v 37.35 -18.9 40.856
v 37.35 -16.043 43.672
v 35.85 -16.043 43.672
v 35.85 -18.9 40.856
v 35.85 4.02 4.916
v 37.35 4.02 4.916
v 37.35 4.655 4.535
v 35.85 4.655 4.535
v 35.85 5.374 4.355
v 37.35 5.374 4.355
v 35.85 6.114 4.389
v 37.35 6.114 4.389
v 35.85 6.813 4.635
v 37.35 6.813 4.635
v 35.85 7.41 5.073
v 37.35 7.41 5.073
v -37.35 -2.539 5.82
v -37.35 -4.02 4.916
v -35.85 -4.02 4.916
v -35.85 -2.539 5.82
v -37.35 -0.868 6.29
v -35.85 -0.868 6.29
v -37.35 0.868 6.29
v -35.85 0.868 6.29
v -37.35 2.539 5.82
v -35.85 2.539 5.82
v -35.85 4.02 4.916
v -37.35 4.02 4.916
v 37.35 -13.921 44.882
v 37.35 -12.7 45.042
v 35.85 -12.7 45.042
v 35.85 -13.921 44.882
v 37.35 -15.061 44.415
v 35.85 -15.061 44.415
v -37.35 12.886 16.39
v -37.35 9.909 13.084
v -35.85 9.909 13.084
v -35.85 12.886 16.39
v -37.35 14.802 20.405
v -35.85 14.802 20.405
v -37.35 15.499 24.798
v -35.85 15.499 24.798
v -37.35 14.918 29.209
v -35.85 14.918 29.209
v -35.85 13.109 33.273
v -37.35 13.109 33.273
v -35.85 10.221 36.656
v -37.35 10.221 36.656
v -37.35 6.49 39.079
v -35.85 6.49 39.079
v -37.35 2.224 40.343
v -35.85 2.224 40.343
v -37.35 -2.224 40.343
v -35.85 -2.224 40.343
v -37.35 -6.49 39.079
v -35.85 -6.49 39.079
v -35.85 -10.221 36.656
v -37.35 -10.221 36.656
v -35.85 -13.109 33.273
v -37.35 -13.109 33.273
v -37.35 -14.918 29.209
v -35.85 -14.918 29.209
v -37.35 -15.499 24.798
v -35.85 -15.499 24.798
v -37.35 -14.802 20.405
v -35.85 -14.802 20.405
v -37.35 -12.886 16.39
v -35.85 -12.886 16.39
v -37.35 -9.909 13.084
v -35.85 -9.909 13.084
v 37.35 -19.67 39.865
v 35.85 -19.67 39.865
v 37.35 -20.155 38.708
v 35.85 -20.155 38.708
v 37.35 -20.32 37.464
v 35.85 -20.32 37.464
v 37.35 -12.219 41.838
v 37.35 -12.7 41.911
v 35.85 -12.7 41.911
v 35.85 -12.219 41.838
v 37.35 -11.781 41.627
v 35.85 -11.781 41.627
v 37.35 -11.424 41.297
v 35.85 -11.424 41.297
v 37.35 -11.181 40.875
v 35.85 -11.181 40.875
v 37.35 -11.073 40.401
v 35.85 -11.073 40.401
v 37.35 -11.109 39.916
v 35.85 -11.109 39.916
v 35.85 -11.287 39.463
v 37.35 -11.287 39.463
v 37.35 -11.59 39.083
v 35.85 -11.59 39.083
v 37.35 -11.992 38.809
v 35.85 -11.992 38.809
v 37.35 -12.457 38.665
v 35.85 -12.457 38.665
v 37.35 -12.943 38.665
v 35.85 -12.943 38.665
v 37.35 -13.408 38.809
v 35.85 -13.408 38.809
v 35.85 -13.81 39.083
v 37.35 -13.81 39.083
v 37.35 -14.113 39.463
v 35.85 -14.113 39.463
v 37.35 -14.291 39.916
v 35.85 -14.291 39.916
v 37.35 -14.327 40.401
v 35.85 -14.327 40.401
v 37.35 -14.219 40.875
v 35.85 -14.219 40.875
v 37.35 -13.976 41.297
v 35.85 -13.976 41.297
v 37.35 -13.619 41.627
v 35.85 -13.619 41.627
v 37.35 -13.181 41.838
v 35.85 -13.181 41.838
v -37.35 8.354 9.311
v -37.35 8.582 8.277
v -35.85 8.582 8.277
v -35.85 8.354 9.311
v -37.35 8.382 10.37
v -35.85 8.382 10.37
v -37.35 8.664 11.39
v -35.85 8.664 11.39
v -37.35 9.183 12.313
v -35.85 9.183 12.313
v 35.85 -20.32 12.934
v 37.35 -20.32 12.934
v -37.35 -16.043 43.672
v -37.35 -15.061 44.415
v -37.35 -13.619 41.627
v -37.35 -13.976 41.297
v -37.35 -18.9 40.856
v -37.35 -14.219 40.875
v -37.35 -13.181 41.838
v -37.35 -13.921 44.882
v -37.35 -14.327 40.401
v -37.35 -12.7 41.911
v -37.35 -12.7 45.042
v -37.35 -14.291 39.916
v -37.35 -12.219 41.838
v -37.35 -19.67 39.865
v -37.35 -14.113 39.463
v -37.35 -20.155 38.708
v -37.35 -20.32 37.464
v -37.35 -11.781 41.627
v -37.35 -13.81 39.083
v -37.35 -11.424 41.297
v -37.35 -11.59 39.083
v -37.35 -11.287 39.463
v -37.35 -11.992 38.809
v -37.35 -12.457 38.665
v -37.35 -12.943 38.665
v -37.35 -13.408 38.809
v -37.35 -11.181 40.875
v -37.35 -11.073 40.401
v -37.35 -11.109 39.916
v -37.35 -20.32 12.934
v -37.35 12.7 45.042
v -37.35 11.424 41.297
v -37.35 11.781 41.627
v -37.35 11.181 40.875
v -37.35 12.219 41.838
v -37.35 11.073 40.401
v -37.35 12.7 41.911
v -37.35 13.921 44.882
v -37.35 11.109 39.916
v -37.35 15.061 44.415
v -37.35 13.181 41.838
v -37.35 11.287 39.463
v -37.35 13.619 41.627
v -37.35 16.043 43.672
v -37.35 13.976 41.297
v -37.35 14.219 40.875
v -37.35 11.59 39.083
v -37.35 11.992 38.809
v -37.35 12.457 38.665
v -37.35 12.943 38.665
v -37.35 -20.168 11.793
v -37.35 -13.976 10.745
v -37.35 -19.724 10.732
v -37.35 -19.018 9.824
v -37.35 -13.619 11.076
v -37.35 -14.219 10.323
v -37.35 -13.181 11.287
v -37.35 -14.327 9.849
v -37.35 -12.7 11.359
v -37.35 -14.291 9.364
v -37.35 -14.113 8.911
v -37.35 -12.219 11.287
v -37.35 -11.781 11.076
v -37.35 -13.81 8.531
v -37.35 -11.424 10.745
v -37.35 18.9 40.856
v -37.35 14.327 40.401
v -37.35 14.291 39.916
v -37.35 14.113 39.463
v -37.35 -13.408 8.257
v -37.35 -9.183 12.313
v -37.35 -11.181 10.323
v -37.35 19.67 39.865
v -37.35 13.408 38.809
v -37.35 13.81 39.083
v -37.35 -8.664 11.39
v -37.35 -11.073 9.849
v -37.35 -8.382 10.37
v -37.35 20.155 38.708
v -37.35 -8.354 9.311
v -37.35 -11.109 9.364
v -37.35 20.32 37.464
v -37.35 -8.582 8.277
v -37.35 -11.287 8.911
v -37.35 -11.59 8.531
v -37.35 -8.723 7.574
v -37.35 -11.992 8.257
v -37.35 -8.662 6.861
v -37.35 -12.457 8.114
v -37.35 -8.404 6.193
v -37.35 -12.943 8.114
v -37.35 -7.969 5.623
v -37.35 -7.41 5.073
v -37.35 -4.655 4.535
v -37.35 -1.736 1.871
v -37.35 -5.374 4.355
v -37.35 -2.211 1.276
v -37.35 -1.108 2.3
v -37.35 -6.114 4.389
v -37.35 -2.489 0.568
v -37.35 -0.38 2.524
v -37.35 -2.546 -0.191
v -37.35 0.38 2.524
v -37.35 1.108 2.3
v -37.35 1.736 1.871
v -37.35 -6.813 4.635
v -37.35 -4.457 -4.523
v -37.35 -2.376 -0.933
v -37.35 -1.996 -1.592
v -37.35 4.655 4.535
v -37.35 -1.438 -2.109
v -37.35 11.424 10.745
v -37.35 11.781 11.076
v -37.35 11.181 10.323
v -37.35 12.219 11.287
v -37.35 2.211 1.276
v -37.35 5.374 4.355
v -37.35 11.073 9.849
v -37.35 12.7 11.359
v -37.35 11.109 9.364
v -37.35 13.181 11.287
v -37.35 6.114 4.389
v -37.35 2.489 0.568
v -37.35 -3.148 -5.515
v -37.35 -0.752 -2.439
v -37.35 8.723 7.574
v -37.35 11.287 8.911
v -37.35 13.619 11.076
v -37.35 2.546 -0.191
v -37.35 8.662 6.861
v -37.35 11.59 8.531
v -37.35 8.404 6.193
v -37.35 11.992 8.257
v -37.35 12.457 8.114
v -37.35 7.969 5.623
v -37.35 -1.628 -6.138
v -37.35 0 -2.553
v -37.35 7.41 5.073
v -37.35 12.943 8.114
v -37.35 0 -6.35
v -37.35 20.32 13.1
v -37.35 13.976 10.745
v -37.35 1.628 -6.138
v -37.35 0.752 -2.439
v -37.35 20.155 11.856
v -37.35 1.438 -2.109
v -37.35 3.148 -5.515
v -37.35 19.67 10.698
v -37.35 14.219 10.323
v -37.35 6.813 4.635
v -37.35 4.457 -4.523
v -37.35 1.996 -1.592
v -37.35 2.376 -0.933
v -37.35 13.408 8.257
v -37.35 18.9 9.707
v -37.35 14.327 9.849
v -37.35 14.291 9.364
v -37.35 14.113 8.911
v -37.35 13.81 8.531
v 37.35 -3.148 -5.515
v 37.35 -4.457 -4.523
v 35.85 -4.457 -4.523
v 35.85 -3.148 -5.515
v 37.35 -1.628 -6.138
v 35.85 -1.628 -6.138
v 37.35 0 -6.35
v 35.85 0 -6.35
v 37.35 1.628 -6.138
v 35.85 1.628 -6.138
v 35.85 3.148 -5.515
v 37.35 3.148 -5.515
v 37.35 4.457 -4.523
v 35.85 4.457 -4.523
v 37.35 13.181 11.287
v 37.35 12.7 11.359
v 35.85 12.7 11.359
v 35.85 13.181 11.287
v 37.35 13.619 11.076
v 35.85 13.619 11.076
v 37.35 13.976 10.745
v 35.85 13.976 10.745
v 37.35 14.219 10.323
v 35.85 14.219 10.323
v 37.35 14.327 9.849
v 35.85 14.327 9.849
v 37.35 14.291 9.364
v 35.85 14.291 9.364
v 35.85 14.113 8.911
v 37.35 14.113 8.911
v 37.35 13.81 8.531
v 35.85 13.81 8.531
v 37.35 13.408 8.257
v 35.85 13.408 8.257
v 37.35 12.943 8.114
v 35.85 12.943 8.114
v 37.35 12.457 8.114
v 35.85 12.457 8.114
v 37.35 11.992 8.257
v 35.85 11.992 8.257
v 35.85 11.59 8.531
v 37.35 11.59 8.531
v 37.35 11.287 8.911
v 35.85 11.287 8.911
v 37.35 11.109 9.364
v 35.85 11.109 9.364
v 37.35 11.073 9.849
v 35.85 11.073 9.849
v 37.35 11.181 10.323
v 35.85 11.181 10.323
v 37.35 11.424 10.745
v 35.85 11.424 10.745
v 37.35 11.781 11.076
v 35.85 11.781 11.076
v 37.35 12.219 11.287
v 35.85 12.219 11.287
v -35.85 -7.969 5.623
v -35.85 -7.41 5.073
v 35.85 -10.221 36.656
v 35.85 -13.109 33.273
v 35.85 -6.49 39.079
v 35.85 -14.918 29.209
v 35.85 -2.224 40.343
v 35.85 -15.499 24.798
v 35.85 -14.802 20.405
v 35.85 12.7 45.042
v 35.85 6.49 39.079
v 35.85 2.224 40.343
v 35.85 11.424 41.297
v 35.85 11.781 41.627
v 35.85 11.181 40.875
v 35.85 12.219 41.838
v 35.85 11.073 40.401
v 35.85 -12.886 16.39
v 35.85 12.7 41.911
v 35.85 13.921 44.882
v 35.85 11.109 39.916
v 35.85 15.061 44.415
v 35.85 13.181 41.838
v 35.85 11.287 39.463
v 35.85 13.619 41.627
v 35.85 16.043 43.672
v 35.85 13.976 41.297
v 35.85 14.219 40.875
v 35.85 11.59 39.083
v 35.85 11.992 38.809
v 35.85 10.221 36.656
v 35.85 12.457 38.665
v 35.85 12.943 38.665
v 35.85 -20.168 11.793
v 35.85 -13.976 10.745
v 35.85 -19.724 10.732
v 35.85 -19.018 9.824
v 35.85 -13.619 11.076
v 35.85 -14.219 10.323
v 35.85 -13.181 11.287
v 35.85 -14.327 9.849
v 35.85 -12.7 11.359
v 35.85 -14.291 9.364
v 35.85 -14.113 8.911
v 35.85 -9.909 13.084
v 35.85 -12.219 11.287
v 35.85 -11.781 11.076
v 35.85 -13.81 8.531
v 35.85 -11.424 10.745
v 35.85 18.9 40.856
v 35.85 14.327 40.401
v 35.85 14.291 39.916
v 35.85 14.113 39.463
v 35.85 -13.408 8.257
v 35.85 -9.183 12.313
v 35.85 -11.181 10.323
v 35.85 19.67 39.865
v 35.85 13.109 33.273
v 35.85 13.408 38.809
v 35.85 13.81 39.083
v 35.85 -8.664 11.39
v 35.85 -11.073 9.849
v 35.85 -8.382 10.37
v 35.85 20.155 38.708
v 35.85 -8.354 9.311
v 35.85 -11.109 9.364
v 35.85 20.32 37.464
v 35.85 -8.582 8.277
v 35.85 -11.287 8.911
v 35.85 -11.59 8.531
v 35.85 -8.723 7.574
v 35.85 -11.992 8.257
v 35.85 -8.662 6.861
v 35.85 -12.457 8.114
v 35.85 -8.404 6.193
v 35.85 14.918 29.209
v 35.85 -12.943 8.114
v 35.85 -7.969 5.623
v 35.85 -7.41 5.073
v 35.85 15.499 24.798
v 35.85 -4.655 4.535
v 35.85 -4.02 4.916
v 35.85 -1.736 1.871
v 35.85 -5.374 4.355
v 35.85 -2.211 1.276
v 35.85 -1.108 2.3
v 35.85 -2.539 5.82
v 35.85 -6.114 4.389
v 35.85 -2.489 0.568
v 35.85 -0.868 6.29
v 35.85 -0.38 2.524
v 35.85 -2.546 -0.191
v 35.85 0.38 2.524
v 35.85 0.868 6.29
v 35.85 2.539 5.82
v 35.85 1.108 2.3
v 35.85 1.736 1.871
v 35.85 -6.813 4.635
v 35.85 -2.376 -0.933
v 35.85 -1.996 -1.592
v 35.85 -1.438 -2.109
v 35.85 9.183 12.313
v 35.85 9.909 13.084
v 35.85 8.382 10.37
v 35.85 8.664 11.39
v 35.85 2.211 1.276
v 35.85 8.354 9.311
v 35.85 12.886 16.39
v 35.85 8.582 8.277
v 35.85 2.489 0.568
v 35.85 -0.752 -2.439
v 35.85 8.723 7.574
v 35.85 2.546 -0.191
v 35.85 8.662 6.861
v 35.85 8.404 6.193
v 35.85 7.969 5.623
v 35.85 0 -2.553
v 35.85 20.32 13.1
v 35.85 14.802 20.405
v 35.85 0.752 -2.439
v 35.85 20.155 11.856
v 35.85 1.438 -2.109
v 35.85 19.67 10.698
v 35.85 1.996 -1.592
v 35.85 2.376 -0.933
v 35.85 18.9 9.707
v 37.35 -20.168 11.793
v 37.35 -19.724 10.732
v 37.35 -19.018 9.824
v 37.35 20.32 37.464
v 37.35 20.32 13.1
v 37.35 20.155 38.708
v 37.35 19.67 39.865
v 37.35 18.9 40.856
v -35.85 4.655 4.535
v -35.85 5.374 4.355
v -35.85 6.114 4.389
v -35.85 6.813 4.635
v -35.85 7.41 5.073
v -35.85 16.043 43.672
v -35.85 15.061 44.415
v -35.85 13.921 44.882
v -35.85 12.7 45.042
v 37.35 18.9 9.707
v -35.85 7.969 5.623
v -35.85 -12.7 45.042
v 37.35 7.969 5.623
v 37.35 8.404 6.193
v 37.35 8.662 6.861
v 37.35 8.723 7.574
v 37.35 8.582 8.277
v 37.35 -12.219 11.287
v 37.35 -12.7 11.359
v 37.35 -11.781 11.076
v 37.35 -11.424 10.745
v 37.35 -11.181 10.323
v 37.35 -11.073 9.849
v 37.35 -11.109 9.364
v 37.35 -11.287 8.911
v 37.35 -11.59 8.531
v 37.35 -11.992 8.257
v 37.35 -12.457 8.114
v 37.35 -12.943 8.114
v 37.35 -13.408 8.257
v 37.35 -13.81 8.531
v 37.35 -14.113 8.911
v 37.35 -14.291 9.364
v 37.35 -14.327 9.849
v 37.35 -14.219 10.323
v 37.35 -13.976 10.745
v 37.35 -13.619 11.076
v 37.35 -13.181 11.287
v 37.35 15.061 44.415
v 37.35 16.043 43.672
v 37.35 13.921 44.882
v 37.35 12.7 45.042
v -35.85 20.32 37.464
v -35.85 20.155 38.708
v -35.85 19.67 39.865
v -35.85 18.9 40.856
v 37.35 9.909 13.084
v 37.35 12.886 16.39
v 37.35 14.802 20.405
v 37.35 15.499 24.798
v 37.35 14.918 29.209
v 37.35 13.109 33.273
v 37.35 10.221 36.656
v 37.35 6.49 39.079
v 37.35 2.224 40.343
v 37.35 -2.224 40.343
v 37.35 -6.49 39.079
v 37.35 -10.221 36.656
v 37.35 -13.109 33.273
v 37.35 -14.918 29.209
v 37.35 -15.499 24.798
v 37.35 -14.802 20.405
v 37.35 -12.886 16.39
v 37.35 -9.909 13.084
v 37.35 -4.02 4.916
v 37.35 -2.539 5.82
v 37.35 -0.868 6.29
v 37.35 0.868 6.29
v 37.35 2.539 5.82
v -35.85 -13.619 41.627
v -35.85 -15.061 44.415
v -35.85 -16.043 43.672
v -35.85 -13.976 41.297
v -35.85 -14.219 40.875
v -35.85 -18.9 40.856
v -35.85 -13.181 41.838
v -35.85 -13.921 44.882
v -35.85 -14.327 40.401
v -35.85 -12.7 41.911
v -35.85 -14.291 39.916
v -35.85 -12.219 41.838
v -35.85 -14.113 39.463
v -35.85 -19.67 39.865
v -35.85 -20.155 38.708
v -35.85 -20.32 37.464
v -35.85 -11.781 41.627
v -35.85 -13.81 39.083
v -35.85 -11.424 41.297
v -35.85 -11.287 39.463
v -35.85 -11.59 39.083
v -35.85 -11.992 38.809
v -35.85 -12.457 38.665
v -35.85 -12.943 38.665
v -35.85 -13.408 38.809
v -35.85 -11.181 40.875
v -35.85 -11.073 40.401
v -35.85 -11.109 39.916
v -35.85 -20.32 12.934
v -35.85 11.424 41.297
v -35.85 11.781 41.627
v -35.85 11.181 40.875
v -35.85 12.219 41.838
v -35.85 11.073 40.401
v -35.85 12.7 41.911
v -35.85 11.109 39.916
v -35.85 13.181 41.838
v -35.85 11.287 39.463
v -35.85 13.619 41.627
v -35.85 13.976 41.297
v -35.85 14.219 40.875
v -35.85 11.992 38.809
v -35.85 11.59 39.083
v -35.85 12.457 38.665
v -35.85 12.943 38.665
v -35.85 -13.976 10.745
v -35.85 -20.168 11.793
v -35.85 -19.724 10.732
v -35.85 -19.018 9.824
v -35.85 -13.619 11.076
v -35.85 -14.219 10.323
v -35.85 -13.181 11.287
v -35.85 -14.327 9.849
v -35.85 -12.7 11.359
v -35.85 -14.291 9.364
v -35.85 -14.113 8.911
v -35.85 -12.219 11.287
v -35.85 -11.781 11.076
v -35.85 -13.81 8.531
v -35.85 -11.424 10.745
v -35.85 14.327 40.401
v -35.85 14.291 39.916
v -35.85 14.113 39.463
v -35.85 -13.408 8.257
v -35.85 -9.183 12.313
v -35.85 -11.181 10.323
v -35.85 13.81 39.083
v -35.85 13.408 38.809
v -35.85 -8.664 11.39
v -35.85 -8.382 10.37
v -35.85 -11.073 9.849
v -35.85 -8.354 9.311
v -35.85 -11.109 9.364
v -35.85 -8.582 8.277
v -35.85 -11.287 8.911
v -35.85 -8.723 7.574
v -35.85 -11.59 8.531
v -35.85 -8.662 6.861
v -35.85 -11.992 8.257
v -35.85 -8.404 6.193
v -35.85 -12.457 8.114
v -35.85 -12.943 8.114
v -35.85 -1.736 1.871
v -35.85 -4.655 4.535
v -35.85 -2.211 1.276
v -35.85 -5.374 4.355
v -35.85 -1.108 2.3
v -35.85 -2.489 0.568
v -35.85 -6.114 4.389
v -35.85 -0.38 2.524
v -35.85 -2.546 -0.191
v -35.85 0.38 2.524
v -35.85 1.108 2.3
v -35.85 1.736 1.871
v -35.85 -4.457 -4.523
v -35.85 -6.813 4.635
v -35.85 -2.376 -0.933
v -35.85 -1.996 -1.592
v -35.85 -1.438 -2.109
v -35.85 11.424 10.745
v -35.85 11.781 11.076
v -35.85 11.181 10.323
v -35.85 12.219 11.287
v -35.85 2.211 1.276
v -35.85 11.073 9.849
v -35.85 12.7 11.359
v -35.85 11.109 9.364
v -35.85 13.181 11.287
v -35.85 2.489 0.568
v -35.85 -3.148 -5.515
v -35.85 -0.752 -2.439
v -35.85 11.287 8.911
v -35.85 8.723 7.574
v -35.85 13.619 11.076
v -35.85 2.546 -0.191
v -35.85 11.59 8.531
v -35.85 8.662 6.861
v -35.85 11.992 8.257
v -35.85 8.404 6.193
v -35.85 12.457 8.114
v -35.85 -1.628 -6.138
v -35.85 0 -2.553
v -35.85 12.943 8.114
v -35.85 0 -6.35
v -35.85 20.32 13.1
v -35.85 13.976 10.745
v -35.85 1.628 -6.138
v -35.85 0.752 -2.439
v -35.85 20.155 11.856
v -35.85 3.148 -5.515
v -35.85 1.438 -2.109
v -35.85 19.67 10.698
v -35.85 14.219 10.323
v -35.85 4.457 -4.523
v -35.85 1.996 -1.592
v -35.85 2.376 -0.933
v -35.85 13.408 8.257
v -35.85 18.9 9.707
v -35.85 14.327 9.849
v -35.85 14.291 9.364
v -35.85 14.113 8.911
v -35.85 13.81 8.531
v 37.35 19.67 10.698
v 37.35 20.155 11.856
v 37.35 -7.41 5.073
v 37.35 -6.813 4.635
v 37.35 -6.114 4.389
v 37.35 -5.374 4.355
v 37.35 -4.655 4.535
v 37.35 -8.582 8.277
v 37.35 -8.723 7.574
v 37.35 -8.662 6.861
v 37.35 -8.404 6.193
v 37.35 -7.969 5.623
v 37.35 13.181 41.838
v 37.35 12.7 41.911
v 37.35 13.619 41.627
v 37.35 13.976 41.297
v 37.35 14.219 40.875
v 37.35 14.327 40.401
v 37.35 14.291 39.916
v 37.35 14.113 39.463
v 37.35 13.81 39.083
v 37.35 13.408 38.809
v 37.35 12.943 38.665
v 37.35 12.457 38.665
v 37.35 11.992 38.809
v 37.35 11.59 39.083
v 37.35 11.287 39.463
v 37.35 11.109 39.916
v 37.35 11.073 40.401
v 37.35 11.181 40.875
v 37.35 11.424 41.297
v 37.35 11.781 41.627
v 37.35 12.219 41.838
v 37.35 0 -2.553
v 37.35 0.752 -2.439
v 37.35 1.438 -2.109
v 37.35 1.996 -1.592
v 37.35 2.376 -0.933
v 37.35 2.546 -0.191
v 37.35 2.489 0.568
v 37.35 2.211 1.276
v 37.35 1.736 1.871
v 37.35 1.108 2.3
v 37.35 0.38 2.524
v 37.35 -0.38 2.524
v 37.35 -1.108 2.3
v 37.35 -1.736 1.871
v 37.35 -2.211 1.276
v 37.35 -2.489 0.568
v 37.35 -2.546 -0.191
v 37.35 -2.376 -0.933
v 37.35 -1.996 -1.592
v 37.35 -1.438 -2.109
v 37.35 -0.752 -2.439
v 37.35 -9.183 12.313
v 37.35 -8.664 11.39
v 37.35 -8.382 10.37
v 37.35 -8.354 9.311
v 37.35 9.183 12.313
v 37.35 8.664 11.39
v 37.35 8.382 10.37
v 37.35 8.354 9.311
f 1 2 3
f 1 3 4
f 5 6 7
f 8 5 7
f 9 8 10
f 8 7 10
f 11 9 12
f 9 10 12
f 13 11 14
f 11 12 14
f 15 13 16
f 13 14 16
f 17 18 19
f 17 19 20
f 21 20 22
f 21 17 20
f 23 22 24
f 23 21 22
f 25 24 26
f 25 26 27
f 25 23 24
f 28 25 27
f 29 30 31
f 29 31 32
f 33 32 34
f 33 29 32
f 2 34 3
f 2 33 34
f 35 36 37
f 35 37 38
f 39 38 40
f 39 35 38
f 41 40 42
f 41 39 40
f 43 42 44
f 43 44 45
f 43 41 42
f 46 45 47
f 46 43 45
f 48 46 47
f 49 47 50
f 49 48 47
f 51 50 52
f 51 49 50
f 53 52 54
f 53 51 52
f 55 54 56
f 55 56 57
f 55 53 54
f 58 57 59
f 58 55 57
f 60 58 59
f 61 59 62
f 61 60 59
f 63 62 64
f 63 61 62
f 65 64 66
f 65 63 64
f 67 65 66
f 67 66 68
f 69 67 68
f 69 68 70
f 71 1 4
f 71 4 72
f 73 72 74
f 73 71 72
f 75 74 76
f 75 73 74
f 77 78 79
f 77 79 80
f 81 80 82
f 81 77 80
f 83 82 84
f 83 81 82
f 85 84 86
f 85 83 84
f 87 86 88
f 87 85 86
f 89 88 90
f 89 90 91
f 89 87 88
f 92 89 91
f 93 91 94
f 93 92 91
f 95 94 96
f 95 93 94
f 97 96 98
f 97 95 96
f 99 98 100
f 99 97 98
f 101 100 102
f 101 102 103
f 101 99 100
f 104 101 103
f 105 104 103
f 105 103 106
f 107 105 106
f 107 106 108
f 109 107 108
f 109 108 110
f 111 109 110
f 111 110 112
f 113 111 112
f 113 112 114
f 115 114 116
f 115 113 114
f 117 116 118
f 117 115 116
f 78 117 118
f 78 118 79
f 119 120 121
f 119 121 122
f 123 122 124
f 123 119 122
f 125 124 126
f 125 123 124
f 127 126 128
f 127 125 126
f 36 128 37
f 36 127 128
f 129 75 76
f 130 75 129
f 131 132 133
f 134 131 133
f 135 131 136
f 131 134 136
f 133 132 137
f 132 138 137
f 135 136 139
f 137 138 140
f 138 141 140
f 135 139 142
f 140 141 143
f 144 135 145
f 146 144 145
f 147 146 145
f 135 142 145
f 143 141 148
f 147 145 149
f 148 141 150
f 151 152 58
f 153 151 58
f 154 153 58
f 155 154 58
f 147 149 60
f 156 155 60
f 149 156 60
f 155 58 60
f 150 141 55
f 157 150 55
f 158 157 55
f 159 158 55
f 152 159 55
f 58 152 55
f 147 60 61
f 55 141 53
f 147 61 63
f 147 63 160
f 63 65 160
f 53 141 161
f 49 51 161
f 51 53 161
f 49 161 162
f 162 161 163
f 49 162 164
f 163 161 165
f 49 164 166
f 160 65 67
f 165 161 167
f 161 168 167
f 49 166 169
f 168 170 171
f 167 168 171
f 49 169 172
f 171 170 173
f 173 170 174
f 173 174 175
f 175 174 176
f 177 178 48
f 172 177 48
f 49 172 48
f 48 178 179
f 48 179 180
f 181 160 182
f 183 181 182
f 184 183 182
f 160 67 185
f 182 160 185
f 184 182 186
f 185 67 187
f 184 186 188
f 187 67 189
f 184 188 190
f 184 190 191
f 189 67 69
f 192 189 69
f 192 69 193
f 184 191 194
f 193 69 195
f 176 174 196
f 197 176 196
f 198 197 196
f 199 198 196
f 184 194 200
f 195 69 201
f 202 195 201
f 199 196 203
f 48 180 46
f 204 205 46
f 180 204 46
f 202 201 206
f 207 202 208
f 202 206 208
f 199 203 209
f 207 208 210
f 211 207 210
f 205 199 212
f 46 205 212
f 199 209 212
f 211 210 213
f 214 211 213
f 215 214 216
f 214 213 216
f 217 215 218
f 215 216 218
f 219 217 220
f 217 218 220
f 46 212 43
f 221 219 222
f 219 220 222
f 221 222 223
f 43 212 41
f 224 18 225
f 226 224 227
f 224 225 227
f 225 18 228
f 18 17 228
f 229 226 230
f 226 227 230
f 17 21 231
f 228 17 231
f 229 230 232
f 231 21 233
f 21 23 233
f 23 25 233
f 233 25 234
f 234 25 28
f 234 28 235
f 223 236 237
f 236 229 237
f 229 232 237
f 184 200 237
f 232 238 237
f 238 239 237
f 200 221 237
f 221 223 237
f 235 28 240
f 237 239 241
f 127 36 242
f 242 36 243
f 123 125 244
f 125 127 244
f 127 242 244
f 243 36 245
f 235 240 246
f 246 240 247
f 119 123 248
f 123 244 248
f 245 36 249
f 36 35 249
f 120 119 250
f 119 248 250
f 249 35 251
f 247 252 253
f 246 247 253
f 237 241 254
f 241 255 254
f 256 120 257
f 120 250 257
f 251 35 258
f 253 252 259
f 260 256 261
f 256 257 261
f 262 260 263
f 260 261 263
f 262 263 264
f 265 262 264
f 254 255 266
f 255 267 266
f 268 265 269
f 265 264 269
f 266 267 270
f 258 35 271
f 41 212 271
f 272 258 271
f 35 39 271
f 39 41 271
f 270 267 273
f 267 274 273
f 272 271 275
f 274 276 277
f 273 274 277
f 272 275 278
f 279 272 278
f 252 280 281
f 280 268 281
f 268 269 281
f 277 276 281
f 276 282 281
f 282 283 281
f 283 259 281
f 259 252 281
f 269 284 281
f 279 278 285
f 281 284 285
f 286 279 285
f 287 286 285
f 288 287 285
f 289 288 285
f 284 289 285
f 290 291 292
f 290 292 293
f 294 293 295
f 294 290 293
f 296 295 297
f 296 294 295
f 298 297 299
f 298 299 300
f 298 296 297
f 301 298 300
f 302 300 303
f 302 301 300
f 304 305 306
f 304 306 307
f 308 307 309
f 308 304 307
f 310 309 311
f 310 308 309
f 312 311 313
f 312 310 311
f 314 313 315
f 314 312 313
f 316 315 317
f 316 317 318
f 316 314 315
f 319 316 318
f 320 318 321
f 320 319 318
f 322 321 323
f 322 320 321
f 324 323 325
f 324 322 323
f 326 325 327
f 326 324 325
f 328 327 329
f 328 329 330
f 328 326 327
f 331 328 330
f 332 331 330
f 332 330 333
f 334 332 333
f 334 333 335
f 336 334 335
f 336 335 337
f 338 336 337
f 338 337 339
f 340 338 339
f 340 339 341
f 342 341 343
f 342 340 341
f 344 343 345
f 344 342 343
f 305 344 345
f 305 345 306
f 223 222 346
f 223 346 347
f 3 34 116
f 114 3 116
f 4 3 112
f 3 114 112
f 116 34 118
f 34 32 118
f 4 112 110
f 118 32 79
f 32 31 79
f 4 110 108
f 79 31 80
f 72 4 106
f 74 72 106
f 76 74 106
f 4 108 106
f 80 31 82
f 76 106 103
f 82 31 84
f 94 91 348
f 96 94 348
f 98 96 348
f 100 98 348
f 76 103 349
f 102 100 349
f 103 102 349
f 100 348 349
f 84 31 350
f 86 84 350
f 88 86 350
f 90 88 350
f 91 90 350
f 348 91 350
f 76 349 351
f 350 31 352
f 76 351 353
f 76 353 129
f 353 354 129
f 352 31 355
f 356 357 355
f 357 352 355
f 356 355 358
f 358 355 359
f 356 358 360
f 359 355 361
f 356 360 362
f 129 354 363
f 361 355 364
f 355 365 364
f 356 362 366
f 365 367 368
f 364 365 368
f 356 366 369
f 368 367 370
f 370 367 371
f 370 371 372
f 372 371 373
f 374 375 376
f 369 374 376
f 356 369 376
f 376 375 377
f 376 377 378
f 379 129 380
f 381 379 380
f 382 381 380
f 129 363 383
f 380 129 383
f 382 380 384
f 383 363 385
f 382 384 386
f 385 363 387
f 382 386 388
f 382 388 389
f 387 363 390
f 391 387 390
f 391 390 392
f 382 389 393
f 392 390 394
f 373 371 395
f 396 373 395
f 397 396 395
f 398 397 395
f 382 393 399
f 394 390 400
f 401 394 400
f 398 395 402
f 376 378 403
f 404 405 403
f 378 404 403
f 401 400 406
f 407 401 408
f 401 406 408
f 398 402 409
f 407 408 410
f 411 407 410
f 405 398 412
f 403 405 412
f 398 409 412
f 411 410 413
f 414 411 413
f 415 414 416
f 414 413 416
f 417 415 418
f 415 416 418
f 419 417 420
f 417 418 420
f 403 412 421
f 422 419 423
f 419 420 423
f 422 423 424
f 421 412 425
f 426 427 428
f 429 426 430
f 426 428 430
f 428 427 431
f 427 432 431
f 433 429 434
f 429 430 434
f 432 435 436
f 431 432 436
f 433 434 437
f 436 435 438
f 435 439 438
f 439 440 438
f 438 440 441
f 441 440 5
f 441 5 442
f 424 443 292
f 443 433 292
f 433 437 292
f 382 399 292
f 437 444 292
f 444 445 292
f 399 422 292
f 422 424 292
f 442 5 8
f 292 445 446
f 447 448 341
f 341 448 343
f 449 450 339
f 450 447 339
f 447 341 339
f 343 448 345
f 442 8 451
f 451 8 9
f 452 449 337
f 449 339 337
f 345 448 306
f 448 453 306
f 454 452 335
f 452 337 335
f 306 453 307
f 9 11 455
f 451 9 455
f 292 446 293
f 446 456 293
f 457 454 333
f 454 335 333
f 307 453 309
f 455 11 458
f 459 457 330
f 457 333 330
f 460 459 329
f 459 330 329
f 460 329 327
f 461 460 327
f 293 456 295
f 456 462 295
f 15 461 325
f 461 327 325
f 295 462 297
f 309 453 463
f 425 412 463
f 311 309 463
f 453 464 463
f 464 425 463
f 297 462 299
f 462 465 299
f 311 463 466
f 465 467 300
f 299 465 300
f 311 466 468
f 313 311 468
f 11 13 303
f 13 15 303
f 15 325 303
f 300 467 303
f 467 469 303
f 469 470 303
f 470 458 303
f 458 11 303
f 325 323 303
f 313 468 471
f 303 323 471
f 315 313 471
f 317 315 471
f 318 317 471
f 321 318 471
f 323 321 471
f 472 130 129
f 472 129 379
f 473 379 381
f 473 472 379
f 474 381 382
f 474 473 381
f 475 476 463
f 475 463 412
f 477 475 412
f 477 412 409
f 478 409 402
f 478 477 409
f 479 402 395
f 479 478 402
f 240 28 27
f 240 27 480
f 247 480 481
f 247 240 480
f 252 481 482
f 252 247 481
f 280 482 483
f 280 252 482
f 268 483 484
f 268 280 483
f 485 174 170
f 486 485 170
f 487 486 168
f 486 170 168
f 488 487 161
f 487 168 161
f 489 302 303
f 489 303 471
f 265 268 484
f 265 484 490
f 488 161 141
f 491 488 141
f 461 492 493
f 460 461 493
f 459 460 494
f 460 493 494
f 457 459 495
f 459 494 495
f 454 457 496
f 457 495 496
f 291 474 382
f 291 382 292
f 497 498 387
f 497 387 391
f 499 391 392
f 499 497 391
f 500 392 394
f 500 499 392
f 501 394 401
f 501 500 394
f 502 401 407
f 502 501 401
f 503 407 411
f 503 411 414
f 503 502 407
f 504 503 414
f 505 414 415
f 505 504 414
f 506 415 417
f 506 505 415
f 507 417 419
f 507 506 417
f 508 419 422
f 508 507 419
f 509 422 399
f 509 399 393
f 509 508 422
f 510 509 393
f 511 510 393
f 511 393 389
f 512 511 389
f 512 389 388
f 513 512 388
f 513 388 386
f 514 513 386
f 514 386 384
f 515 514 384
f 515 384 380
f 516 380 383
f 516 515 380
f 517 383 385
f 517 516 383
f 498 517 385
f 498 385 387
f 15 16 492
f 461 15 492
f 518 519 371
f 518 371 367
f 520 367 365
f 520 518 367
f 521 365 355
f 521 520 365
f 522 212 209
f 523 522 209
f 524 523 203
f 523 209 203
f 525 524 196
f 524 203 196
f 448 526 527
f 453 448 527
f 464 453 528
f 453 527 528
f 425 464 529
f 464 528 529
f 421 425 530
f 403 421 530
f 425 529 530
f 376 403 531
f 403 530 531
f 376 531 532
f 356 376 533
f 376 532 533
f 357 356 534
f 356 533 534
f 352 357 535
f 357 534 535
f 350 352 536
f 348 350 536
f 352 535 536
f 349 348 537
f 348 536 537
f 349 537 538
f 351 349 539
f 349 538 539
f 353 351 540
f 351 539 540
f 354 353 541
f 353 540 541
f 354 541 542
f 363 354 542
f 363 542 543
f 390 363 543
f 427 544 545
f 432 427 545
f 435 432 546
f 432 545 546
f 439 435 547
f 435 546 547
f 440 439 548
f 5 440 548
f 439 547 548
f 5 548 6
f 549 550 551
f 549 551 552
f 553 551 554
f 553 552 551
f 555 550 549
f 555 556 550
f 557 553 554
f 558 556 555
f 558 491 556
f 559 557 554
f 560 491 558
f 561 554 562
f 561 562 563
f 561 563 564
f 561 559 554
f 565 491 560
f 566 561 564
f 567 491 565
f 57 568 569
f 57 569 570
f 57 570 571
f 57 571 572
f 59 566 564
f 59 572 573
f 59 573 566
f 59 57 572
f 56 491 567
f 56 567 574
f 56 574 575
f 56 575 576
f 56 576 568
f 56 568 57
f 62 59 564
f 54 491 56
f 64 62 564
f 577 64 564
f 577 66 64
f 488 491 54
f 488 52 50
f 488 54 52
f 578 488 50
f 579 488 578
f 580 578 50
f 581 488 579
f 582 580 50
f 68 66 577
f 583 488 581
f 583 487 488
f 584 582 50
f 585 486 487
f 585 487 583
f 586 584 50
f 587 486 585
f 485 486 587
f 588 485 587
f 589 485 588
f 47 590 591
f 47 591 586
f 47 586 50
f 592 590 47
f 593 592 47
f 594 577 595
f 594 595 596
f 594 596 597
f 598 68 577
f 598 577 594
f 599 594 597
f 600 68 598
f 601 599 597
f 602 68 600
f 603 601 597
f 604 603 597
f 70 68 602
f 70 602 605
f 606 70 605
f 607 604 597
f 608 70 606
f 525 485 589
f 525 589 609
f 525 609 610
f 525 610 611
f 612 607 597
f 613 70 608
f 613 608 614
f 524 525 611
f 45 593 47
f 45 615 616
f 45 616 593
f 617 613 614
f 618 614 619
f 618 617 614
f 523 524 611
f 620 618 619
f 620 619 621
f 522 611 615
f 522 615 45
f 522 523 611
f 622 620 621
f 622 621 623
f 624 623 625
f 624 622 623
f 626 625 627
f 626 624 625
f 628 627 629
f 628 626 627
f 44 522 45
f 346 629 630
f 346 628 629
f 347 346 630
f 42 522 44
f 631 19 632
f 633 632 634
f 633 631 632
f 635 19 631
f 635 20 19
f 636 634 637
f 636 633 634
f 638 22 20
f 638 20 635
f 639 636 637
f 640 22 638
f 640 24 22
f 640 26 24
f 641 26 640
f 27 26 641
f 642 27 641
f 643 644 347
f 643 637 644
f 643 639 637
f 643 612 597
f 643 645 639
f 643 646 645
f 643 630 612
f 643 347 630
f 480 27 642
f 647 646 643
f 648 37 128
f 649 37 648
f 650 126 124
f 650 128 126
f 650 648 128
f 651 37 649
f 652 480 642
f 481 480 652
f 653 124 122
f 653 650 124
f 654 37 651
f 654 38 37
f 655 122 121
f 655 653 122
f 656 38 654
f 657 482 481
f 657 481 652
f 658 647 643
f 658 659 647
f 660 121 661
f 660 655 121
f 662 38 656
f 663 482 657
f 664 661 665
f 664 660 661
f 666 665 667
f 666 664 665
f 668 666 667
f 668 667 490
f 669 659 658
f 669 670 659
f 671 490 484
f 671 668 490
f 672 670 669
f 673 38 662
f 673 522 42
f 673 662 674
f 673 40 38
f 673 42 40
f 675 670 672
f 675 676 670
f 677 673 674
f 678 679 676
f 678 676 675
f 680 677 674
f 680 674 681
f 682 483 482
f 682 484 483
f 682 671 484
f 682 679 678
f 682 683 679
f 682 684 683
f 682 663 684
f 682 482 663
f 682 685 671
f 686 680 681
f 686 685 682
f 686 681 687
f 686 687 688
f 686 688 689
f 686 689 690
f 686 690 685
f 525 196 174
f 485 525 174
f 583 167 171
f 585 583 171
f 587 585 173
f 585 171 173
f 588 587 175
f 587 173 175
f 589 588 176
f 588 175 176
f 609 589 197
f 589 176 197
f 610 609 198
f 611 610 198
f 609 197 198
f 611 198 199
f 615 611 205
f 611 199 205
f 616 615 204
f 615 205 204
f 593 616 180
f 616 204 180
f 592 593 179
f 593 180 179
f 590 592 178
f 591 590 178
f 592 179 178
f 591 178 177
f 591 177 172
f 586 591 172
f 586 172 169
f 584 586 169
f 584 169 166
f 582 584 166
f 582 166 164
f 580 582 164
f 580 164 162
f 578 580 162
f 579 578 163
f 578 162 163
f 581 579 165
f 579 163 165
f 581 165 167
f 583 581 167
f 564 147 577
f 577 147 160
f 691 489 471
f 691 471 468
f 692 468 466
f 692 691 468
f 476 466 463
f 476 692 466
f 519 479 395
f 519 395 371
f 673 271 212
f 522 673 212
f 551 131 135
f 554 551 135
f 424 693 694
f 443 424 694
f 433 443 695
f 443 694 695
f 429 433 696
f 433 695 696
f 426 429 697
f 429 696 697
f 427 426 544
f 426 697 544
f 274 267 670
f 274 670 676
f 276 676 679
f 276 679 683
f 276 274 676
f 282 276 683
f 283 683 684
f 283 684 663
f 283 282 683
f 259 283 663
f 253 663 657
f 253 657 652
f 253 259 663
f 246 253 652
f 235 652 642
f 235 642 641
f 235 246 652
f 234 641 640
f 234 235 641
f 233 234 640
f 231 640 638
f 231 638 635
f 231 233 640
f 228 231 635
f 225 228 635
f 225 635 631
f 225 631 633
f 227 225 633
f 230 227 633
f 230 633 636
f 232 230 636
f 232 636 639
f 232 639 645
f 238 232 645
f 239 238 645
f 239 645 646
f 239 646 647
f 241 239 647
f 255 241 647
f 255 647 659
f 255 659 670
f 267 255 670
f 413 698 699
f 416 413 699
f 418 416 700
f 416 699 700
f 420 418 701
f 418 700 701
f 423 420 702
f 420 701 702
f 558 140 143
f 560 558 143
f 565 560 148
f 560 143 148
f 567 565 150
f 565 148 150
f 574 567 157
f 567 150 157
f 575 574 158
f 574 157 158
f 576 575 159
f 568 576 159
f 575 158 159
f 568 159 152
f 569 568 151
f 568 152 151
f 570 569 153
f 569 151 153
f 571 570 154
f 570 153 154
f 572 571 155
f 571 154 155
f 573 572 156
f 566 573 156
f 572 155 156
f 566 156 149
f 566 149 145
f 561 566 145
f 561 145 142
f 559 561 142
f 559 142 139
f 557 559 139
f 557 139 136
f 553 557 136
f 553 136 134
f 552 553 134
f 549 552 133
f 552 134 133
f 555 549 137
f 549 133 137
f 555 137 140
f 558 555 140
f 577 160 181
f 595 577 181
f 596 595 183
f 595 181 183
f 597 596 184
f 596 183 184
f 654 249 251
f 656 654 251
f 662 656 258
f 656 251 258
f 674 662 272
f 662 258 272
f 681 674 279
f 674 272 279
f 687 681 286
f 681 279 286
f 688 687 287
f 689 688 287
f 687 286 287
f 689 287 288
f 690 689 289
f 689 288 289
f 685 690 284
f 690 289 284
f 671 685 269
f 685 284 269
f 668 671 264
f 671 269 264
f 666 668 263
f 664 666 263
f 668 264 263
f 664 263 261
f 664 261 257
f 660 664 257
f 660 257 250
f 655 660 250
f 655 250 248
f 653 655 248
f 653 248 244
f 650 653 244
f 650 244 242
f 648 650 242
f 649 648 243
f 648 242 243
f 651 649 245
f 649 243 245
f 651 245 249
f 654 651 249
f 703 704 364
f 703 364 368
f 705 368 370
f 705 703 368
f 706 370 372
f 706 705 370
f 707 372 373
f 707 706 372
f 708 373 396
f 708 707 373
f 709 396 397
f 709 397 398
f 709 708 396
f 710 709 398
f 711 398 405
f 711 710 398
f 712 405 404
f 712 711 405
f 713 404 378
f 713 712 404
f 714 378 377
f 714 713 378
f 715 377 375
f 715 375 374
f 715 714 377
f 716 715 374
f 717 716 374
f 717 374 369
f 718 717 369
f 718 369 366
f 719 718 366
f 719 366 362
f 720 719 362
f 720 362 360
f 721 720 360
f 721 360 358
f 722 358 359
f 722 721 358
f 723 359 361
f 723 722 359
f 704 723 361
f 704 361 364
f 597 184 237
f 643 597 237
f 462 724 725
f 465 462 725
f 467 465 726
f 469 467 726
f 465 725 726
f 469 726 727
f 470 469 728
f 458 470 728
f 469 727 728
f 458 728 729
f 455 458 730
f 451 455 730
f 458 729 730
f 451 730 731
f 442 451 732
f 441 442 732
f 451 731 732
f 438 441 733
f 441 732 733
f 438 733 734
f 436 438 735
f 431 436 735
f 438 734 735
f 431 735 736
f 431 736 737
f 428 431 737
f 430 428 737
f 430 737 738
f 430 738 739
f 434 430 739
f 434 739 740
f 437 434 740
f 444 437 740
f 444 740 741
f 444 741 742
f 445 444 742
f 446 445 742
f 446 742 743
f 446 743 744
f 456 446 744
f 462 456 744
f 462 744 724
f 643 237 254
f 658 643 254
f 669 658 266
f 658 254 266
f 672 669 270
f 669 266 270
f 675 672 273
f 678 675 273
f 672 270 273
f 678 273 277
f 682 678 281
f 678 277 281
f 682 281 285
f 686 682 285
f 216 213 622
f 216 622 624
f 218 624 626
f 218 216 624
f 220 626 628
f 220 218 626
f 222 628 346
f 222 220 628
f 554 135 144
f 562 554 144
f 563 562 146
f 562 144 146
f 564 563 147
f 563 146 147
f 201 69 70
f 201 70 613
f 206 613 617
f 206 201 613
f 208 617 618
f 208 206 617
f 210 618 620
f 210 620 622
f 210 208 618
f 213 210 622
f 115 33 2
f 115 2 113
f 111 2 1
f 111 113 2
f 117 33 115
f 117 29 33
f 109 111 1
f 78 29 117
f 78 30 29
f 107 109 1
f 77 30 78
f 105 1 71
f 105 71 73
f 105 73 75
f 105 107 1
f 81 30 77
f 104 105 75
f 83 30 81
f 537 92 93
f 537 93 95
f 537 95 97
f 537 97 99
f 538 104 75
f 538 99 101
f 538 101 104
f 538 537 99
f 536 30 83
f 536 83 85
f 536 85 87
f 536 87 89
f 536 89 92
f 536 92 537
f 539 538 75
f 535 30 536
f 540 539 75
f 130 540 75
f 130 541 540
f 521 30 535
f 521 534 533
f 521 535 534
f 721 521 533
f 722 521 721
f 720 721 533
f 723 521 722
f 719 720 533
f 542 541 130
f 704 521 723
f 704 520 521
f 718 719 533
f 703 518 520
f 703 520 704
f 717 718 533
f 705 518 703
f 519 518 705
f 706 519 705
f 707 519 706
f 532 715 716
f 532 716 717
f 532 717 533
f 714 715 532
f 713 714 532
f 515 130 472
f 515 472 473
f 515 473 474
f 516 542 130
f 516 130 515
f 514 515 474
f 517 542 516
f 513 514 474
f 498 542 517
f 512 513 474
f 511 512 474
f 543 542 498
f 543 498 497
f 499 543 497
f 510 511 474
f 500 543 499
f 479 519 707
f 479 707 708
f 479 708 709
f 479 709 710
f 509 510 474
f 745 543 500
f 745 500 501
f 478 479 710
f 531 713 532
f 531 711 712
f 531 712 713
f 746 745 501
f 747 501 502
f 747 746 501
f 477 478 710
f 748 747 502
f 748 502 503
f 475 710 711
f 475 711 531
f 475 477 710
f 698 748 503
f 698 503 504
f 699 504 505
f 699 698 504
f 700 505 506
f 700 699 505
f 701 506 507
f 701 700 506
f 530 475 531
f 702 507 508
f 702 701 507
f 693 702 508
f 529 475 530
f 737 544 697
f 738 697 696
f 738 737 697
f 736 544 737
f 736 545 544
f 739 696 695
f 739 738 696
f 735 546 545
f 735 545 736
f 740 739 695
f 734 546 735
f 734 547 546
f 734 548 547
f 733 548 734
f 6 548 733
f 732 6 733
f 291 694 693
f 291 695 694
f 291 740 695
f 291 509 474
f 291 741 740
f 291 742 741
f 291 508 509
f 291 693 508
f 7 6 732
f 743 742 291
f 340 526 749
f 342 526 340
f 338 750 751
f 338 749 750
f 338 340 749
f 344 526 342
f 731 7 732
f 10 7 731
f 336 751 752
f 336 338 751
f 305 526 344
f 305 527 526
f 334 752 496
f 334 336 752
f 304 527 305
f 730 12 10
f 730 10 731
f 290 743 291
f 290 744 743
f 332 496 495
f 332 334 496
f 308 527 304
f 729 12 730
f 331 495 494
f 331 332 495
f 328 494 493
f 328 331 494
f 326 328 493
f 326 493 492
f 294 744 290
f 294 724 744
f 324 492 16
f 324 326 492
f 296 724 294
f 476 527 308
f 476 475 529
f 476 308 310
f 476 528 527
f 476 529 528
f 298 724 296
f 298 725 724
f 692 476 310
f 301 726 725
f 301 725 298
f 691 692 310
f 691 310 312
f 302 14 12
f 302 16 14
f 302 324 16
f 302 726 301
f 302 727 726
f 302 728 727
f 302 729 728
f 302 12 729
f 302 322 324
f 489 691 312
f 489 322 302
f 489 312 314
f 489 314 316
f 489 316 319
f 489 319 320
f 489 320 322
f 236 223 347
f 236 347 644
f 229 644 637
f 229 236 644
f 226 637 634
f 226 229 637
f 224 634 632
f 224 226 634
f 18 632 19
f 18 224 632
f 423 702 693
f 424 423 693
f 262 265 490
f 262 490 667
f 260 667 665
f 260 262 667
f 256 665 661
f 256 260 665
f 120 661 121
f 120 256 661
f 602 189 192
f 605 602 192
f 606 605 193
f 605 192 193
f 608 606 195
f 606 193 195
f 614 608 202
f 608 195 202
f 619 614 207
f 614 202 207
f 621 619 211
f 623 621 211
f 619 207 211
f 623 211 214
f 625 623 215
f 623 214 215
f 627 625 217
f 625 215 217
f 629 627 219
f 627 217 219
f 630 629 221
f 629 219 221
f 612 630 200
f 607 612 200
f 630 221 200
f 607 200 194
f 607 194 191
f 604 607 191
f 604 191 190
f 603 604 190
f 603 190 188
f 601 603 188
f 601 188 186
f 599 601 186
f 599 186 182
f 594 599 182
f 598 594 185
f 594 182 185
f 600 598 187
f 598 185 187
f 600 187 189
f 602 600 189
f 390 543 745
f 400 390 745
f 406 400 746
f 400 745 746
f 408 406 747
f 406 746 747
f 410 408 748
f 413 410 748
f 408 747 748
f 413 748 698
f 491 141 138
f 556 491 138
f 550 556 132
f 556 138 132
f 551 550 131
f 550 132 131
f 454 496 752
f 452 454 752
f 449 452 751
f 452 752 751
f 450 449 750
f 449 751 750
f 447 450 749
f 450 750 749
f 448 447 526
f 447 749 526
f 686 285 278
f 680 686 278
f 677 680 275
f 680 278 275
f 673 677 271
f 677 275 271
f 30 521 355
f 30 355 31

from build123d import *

# Parameters (mm, degrees)
SKETCH1_R              = 1.63195
BOSS_EXTRUDE1_DEPTH    = 1.500000048
F_10_CLEARANCE_HOLE1_D = 5.1054


with BuildPart() as part:
    # Sketch1 → Boss-Extrude1 (new body)
    with BuildSketch(Plane.ZY.offset(-37.349999952)):
        with BuildLine():
            Line((-4.523311473, 4.45669758), (9.707310197, 18.900023185))
            ThreePointArc((9.707310197, 18.900023185), (11.26095727, 19.950686367), (13.099793802, 20.32))
            Line((13.099793802, 20.32), (37.463604709, 20.32))
            ThreePointArc((37.463604709, 20.32), (39.30244124, 19.950686367), (40.856088313, 18.900023185))
            Line((40.856088313, 18.900023185), (43.671506489, 16.042523185))
            ThreePointArc((43.671506489, 16.042523185), (44.685728537, 14.50619809), (45.041522884, 12.7))
            Line((45.041522884, 12.7), (45.041522884, -12.7))
            ThreePointArc((45.041522884, -12.7), (44.685728537, -14.50619809), (43.671506489, -16.042523185))
            Line((43.671506489, -16.042523185), (40.856088313, -18.900023185))
            ThreePointArc((40.856088313, -18.900023185), (39.30244124, -19.950686367), (37.463604709, -20.32))
            Line((37.463604709, -20.32), (12.933675594, -20.32))
            ThreePointArc((12.933675594, -20.32), (11.248075439, -19.981462503), (9.823898956, -19.018354586))
            Line((9.823898956, -19.018354586), (-4.523311473, -4.45669758))
            ThreePointArc((-4.523311473, -4.45669758), (-6.35, 0), (-4.523311473, 4.45669758))
        make_face()
        with Locations((9.727227116, 12.7)):
            Circle(SKETCH1_R, mode=Mode.SUBTRACT)
        with Locations((40.279022884, 12.7)):
            Circle(SKETCH1_R, mode=Mode.SUBTRACT)
        with Locations((40.279022884, -12.7)):
            Circle(SKETCH1_R, mode=Mode.SUBTRACT)
        with Locations((9.727227116, -12.7)):
            Circle(SKETCH1_R, mode=Mode.SUBTRACT)
        with BuildLine():
            Line((5.623425104, -7.969382632), (5.072632622, -7.4103575))
            ThreePointArc((5.072632622, -7.4103575), (4.344674108, -5.74512827), (4.915683722, -4.019770335))
            ThreePointArc((4.915683722, -4.019770335), (6.35, 0), (4.915683722, 4.019770335))
            ThreePointArc((4.915683722, 4.019770335), (4.344674108, 5.74512827), (5.072632622, 7.4103575))
            Line((5.072632622, 7.4103575), (5.623425104, 7.969382632))
            ThreePointArc((5.623425104, 7.969382632), (6.86096625, 8.661509389), (8.276695412, 8.582398828))
            ThreePointArc((8.276695412, 8.582398828), (10.888550016, 8.491673639), (13.084224026, 9.909076607))
            ThreePointArc((13.084224026, 9.909076607), (40.503124988, 0), (13.084224026, -9.909076607))
            ThreePointArc((13.084224026, -9.909076607), (10.888550016, -8.491673639), (8.276695412, -8.582398828))
            ThreePointArc((8.276695412, -8.582398828), (6.86096625, -8.661509389), (5.623425104, -7.969382632))
        make_face(mode=Mode.SUBTRACT)
    extrude(amount=BOSS_EXTRUDE1_DEPTH)

    # #10 Clearance Hole1 (through all)
    with Locations(Plane.ZY.offset(-35.849999904)):
        with Locations((0, 0)):
            Hole(F_10_CLEARANCE_HOLE1_D / 2)


with BuildPart() as body_2:
    # Mirror2: mirrored copy
    add(part.part.mirror(Plane(origin=(0, 0, 0), x_dir=(0, 0, 1), z_dir=(1, 0, 0))))


solid = Compound([part.part, body_2.part])
